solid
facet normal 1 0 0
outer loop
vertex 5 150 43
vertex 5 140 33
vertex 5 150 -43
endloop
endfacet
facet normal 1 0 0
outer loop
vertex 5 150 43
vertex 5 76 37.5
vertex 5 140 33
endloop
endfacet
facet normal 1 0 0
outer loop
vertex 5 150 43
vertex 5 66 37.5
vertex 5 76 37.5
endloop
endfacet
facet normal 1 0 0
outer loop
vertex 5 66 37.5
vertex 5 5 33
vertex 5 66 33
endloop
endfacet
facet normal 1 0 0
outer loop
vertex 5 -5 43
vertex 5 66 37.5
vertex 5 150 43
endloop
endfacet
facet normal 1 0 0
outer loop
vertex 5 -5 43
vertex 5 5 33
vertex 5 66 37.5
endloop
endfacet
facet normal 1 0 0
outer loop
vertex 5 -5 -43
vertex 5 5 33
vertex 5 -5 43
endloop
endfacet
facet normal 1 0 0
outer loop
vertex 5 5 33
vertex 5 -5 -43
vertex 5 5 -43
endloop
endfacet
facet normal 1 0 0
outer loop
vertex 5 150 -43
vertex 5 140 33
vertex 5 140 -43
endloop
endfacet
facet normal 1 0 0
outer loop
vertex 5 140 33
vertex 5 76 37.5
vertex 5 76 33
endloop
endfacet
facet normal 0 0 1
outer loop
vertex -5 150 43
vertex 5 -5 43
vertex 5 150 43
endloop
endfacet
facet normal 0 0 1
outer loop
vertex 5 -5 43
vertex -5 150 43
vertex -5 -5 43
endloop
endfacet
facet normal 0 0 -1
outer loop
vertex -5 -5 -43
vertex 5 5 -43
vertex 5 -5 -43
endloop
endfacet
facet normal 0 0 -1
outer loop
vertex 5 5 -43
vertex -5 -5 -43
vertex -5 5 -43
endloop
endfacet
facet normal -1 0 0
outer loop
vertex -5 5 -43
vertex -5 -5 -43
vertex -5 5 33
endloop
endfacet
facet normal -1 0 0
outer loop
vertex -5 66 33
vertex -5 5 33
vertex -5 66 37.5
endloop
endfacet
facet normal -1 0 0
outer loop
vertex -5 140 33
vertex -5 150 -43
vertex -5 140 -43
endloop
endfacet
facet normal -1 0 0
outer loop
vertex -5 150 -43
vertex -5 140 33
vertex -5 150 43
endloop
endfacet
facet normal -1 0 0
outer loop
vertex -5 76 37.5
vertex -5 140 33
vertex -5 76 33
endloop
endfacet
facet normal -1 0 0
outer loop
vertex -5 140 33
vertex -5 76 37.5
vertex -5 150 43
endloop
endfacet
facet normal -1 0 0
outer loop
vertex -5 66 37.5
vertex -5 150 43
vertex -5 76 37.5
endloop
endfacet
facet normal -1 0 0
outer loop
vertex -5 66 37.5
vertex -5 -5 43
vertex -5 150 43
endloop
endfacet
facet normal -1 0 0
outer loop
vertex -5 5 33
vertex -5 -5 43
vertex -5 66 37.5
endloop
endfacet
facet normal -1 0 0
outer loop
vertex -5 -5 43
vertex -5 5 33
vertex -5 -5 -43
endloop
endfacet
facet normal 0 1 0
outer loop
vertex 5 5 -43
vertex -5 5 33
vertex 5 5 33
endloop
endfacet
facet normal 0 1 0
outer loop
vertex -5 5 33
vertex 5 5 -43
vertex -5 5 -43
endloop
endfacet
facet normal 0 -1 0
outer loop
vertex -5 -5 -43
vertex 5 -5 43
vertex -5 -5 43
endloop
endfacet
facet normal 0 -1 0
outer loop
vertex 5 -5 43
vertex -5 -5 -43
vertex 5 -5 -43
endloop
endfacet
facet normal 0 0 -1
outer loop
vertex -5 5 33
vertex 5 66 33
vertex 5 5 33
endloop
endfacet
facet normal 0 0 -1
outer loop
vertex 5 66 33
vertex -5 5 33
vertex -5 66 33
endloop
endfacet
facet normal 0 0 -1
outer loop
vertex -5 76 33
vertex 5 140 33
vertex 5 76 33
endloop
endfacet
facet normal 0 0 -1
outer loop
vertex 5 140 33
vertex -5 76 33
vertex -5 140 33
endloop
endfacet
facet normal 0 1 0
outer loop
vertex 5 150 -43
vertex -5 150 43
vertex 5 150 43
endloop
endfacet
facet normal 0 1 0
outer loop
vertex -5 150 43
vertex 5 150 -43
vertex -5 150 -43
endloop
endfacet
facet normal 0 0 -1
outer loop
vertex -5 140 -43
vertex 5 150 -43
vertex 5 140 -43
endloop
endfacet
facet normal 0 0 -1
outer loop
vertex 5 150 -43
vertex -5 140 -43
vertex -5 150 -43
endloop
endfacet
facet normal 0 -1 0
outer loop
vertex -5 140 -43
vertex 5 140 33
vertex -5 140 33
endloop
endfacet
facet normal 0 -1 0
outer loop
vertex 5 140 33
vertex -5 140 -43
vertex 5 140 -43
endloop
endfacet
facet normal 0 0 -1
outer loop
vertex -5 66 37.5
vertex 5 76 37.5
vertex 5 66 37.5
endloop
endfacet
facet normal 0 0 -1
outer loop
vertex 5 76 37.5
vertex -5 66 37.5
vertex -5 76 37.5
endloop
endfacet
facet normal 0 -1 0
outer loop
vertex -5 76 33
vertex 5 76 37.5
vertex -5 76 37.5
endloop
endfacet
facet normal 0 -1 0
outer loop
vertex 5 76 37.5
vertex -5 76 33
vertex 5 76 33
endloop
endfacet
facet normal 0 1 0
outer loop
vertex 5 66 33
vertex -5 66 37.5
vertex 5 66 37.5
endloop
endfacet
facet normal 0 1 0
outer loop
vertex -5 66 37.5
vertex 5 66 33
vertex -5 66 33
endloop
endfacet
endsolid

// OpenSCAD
psu_height = 86;
psu_width = 150;
psu_length = 140;

difference() {
    union() {
        cube(size = [10, 10, psu_height], center = true);
        translate([0, 75, 38])
        cube(size = [10, psu_width, 10], center = true);
        translate([0, 145, 0])
        cube(size = [10, 10, psu_height], center = true);
    }

    translate([0, (psu_width / 2) - 4, (psu_height / 2) - 8])
    cube(size = [10, 10, 5], center = true);
}
